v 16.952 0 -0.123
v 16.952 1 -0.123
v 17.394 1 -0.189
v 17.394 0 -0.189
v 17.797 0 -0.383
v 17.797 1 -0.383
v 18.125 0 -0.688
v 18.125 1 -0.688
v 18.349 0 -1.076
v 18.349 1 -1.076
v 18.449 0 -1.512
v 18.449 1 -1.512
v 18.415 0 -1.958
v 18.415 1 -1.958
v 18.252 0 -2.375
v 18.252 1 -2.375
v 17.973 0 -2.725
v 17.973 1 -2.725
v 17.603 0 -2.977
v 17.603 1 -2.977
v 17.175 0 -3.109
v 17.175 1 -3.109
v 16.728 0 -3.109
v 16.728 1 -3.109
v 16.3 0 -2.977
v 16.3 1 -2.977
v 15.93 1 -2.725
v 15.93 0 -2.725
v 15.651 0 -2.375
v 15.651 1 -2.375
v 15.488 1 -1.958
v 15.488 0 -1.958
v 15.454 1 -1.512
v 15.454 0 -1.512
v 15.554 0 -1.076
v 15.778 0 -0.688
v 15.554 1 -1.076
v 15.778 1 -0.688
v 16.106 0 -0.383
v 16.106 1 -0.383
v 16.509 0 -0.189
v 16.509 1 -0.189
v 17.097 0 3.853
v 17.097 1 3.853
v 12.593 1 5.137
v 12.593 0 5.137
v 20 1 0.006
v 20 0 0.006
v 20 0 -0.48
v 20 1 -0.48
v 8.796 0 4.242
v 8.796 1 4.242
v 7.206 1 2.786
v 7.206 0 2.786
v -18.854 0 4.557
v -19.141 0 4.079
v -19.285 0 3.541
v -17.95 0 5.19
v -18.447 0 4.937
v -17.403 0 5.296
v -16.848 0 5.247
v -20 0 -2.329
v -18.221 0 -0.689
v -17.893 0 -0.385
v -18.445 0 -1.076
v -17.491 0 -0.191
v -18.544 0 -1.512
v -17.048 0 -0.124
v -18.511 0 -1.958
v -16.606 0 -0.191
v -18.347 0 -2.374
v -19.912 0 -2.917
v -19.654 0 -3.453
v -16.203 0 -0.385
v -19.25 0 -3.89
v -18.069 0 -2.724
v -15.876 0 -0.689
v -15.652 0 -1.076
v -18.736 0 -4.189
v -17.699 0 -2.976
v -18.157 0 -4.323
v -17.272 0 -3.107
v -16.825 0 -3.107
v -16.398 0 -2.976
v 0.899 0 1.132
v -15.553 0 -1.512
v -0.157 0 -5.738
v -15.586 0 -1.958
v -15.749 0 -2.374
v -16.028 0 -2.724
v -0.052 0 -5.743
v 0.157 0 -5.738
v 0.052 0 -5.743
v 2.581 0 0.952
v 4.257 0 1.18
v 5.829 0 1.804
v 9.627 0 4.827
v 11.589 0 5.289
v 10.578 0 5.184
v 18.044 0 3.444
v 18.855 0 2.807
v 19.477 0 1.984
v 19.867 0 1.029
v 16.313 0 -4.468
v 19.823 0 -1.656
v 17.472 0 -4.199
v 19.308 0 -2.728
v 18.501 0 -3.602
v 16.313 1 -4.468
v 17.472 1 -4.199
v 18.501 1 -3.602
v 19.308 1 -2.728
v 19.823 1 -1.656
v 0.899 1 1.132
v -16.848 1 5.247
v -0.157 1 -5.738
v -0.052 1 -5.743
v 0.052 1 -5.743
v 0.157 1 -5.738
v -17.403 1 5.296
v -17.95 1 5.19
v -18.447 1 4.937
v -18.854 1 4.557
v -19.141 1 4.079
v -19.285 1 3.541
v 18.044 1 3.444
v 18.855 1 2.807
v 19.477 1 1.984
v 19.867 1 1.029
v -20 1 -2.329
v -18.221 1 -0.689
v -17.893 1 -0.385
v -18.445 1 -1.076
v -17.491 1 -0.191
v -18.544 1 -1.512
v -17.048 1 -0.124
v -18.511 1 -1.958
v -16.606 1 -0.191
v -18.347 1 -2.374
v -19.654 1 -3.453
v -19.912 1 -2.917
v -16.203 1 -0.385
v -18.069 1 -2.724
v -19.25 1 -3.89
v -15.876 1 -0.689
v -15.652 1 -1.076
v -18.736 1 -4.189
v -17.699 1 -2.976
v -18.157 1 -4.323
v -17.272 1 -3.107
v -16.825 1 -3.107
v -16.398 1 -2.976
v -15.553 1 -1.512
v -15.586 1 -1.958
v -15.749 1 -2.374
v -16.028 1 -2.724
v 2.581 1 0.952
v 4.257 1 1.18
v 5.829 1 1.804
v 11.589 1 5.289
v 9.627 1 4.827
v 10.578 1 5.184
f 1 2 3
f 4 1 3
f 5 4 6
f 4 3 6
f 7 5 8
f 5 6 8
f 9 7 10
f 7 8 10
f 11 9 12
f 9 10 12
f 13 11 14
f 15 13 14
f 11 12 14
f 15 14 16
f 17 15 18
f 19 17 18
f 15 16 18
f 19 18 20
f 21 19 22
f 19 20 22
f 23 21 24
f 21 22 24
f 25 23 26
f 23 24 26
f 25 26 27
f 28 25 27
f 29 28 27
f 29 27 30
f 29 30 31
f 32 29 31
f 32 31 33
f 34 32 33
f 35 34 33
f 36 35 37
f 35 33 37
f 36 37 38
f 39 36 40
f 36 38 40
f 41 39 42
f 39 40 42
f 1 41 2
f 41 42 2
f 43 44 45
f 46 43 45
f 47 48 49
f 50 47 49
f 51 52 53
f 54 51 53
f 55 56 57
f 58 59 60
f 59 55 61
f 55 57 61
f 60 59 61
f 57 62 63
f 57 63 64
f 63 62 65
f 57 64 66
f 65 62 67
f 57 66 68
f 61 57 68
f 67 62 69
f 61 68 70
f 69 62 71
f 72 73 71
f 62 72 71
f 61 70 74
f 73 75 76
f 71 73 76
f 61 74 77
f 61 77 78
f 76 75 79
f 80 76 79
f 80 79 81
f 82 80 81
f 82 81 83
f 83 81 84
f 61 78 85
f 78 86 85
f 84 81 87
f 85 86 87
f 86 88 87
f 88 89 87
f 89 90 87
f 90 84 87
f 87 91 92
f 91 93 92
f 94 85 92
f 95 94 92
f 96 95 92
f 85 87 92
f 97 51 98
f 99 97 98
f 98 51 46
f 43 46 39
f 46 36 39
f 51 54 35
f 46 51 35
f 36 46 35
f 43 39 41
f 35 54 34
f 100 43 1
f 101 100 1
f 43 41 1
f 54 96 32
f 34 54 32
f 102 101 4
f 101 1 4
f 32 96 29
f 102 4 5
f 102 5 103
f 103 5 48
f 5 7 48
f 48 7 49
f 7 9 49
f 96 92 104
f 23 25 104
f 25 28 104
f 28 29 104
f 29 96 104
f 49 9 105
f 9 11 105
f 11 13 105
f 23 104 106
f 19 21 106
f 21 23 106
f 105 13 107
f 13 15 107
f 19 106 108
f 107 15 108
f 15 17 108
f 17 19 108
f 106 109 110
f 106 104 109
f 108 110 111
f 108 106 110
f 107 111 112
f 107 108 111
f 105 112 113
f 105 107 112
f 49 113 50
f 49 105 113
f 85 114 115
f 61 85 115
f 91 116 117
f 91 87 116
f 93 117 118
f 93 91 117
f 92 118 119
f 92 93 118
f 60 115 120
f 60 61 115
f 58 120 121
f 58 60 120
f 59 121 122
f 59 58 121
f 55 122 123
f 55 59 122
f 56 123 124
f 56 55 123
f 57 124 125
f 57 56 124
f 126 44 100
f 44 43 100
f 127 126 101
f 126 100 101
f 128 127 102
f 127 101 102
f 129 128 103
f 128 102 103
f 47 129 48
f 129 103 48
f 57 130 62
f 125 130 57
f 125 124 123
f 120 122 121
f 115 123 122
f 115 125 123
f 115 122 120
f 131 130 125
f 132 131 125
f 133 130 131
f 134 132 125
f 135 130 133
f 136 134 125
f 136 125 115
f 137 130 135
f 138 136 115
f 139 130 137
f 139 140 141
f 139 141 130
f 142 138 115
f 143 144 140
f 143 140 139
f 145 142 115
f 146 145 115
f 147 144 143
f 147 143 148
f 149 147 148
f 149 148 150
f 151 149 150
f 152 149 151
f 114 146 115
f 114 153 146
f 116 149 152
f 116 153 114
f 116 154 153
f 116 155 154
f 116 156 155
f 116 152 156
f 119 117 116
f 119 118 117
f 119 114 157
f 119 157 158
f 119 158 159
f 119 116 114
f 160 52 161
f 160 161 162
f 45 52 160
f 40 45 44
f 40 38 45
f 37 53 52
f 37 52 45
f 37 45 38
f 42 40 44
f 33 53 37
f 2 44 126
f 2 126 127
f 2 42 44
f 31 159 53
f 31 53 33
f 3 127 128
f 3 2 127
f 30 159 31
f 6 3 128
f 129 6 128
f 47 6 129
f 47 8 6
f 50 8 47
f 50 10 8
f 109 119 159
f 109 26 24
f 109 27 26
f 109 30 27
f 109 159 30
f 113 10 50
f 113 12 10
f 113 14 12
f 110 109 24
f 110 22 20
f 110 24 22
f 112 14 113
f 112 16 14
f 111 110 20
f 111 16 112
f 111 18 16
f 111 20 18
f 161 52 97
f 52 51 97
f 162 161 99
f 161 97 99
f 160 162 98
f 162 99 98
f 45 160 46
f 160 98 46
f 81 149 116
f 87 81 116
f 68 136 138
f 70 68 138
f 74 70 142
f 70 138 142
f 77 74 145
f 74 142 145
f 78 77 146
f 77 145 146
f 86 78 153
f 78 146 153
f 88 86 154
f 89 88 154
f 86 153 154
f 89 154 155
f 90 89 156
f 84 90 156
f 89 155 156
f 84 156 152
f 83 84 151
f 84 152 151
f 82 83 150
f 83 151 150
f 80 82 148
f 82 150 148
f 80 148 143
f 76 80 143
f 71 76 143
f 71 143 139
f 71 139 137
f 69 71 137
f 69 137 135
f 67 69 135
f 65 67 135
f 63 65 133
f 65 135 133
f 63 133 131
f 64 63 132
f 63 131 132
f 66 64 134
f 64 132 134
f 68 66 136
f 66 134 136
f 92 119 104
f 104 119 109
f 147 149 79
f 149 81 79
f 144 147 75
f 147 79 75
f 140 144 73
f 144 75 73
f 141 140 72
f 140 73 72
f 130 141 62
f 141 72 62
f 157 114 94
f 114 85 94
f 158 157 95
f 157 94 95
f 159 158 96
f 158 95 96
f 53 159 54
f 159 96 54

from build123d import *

# Parameters (mm, degrees)
SKETCH1_W           = 40
SKETCH1_H           = 11.5
BOSS_EXTRUDE1_DEPTH = 1
CUT_EXTRUDE1_DEPTH  = 1
FILLET1_R           = 2
FILLET2_R           = 4
FILLET3_R           = 2
CUT_EXTRUDE2_DEPTH  = 1
CUT_EXTRUDE3_DEPTH  = 1
FILLET4_R           = 2
FILLET5_R           = 7
FILLET6_R           = 4
FILLET7_R           = 4
SKETCH5_R           = 1.5
SKETCH5_R_2         = 1.501453264
CUT_EXTRUDE4_DEPTH  = 1


with BuildPart() as part:
    # Sketch1 → Boss-Extrude1 (new body)
    with BuildSketch(Plane(origin=(0, 0, 0), x_dir=(1, 0, 0), z_dir=(0, 1, 0))):
        Rectangle(SKETCH1_W, SKETCH1_H)
    extrude(amount=BOSS_EXTRUDE1_DEPTH)

    # Sketch2 → Cut-Extrude1 (cut)
    with BuildSketch(Plane(origin=(0, 1, 0), x_dir=(1, 0, 0), z_dir=(0, 1, 0))):
        Polygon((-20, 4.177870703), (0, 5.75), (-20, 5.75), align=None)
        Polygon((20, 5.75), (0, 5.75), (20, 4.177870703), align=None)
    extrude(amount=-CUT_EXTRUDE1_DEPTH, mode=Mode.SUBTRACT)

    # Fillet1
    fillet1_edges = [part.edges().sort_by_distance(p)[0] for p in [
        (0, 0.5, -5.75),
    ]]
    fillet(fillet1_edges, radius=FILLET1_R)

    # Fillet2
    fillet2_edges = [part.edges().sort_by_distance(p)[0] for p in [
        (20, 0.5, -4.177870703),
    ]]
    fillet(fillet2_edges, radius=FILLET2_R)

    # Fillet3
    fillet3_edges = [part.edges().sort_by_distance(p)[0] for p in [
        (-20, 0.5, -4.177870703),
    ]]
    fillet(fillet3_edges, radius=FILLET3_R)

    # Sketch3 → Cut-Extrude2 (cut)
    with BuildSketch(Plane(origin=(0, 1, 0), x_dir=(1, 0, 0), z_dir=(0, 1, 0))):
        Polygon((-20, 2.328914172), (-19.016050198, -5.75), (-20, -5.75), align=None)
    extrude(amount=-CUT_EXTRUDE2_DEPTH, mode=Mode.SUBTRACT)

    # Sketch4 → Cut-Extrude3 (cut)
    with BuildSketch(Plane(origin=(0, 1, 0), x_dir=(1, 0, 0), z_dir=(0, 1, 0))):
        Polygon((4.487841755, -0.29957878), (-19.016050198, -5.75), (10.444676757, -5.75), align=None)
        Polygon((20, -3.02478939), (10.444676757, -5.75), (20, -5.75), align=None)
    extrude(amount=-CUT_EXTRUDE3_DEPTH, mode=Mode.SUBTRACT)

    # Fillet4
    fillet4_edges = [part.edges().sort_by_distance(p)[0] for p in [
        (-19.016050198, 0.5, 5.75),
    ]]
    fillet(fillet4_edges, radius=FILLET4_R)

    # Fillet5
    fillet5_edges = [part.edges().sort_by_distance(p)[0] for p in [
        (4.487841755, 0.5, 0.29957878),
    ]]
    fillet(fillet5_edges, radius=FILLET5_R)

    # Fillet6
    fillet6_edges = [part.edges().sort_by_distance(p)[0] for p in [
        (10.444676757, 0.5, 5.75),
    ]]
    fillet(fillet6_edges, radius=FILLET6_R)

    # Fillet7
    fillet7_edges = [part.edges().sort_by_distance(p)[0] for p in [
        (20, 0.5, 3.02478939),
    ]]
    fillet(fillet7_edges, radius=FILLET7_R)

    # Sketch5 → Cut-Extrude4 (cut)
    with BuildSketch(Plane(origin=(0, 1, 0), x_dir=(1, 0, 0), z_dir=(0, 1, 0))):
        with Locations(Location((-17.048407867, 1.6240543, 0), (0, 0, 270))):
            Circle(SKETCH5_R)
        with Locations(Location((16.951592133, 1.6240543, 0), (0, 0, 270))):
            Circle(SKETCH5_R_2)
    extrude(amount=-CUT_EXTRUDE4_DEPTH, mode=Mode.SUBTRACT)


solid = part.part
